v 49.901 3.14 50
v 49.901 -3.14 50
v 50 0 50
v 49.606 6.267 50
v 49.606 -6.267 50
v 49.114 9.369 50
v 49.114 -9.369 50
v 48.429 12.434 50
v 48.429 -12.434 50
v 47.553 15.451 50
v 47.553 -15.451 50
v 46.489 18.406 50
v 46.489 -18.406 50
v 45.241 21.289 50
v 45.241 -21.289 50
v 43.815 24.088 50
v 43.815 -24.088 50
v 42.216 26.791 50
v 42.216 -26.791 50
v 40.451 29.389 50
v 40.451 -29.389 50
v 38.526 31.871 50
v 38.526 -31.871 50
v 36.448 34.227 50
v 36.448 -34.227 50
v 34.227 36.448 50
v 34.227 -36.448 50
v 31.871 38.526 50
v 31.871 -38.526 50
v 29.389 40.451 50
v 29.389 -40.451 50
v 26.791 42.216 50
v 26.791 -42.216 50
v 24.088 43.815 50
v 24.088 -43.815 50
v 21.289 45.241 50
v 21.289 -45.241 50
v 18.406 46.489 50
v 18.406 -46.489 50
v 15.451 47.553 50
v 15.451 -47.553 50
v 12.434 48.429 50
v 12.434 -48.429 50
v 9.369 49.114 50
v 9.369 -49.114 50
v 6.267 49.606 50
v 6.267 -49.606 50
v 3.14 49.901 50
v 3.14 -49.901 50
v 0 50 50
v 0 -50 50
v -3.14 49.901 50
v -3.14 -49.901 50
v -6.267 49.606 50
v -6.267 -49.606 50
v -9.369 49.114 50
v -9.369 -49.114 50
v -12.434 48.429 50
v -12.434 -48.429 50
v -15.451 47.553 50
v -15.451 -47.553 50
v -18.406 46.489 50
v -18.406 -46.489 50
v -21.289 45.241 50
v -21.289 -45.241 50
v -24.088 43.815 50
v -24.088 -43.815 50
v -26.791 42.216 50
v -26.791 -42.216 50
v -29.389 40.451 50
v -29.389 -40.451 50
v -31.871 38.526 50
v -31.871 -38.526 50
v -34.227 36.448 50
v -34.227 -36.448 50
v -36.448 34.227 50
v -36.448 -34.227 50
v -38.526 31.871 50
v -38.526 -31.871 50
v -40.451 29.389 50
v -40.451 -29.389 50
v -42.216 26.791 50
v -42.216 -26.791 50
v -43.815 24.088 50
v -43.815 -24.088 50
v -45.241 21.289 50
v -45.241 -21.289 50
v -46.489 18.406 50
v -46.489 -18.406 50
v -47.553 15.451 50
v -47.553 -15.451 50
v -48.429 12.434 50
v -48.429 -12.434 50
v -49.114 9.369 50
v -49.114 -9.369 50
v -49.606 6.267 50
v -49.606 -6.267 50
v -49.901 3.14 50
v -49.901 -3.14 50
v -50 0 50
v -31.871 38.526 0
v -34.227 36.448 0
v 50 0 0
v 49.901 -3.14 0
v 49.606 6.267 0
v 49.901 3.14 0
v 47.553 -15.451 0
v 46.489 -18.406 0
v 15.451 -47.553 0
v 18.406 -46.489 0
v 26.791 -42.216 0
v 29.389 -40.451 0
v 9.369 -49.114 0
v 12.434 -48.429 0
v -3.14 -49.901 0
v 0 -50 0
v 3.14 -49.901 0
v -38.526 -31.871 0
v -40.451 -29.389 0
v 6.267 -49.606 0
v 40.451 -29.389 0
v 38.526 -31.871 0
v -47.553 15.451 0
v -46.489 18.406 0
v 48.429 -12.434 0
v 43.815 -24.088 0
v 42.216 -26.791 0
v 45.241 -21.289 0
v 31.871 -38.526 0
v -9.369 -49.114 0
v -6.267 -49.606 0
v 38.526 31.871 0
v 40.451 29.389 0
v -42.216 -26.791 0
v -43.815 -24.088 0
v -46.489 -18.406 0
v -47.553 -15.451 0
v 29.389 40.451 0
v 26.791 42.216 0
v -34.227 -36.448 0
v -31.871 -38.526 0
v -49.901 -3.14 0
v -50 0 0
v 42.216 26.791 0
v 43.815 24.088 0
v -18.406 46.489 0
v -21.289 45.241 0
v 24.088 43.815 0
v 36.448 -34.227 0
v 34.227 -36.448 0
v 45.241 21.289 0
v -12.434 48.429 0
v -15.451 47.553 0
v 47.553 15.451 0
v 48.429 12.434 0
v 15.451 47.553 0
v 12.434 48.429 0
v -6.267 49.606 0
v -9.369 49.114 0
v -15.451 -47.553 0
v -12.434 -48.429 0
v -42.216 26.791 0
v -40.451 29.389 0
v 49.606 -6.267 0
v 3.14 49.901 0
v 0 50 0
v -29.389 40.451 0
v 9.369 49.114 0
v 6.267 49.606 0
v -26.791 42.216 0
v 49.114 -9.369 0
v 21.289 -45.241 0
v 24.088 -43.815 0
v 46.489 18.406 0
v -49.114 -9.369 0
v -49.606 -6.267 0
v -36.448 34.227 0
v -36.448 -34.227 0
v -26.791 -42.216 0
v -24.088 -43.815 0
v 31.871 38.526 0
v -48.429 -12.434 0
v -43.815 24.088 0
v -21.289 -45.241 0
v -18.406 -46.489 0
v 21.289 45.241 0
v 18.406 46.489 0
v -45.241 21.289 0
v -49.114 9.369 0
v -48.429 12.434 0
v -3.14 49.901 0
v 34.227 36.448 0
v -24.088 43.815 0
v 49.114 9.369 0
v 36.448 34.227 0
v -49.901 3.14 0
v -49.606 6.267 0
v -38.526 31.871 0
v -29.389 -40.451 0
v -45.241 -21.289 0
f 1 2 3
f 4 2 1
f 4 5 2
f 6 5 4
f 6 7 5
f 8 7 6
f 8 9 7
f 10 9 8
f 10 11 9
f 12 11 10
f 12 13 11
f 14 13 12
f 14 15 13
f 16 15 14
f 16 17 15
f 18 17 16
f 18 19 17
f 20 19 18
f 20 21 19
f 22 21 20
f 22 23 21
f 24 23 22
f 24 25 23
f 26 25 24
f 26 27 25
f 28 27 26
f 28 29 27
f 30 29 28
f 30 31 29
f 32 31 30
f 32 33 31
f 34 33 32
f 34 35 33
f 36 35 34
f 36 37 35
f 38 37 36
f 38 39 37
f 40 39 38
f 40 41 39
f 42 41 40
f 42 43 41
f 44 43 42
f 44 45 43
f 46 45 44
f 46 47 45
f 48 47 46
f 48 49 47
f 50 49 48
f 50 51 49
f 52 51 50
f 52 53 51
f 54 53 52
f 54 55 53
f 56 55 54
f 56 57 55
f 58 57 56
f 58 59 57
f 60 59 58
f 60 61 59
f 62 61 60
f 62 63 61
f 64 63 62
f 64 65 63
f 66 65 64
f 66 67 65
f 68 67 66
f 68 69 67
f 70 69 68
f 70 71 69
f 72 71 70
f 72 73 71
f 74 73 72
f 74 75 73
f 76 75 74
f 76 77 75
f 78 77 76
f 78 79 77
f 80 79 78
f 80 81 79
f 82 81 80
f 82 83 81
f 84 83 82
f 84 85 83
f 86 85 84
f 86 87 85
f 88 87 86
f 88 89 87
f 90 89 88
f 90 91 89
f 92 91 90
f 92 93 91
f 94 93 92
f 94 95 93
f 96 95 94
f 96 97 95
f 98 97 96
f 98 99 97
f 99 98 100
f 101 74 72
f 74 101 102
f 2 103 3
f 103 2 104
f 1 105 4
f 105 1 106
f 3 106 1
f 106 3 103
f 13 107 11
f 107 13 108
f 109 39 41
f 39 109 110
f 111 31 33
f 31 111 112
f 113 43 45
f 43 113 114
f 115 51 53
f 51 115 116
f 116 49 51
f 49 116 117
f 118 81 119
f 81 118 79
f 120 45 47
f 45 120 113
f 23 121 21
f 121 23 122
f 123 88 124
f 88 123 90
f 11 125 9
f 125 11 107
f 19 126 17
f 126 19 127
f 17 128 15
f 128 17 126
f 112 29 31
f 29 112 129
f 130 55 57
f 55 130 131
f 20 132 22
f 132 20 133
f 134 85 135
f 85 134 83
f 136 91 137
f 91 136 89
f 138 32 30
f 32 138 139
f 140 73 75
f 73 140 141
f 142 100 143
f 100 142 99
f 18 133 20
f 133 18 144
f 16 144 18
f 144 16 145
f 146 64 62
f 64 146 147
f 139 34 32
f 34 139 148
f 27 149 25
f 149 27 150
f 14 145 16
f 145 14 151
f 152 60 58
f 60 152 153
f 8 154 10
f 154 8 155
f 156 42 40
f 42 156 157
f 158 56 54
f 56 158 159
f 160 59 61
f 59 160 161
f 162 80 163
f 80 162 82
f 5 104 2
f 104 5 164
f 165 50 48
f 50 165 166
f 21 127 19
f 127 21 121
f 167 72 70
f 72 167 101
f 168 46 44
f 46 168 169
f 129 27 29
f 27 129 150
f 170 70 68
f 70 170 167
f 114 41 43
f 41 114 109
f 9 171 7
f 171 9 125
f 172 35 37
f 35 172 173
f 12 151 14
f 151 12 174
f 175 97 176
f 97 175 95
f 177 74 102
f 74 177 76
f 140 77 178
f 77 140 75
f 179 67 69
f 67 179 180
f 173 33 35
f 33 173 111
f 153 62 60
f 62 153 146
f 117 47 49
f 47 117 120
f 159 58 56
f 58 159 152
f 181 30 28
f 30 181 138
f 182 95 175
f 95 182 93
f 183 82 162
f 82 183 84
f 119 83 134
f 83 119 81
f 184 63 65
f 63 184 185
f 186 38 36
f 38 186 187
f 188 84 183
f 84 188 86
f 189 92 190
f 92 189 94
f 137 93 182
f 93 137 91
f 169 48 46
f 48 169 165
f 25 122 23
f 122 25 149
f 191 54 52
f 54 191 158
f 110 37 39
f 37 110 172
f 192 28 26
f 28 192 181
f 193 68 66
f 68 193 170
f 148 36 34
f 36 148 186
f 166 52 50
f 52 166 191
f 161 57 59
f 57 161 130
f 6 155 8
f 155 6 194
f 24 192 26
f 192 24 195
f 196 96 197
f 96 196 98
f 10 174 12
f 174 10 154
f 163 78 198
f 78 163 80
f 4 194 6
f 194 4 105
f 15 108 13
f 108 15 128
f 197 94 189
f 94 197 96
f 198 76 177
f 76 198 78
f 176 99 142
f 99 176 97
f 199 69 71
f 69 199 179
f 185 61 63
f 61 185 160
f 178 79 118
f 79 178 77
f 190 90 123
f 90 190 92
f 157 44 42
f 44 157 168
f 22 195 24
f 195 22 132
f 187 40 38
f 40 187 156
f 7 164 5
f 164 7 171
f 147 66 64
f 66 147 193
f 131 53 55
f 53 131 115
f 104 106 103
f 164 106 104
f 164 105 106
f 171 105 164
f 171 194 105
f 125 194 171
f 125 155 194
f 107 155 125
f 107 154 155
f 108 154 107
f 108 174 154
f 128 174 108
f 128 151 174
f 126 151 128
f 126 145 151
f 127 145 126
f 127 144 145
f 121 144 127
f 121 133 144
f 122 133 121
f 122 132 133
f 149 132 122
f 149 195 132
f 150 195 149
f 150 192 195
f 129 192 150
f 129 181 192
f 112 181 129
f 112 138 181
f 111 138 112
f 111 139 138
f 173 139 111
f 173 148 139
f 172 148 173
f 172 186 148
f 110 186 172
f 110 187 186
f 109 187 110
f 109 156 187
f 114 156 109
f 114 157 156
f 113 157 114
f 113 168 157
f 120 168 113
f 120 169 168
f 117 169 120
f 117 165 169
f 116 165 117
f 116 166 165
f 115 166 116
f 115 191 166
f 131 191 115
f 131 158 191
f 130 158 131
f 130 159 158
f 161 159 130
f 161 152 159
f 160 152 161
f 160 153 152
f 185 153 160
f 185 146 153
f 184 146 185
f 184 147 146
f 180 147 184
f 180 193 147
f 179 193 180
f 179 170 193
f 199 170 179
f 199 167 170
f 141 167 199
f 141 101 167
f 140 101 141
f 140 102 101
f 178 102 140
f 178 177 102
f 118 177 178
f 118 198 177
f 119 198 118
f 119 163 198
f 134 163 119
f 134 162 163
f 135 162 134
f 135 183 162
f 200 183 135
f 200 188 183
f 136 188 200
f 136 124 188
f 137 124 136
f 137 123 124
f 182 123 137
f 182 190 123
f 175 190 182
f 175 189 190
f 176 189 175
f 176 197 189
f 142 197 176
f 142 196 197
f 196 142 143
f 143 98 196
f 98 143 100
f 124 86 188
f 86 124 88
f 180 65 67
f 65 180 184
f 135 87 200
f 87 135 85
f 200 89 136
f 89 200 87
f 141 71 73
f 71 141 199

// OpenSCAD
intersection(){cube(size=100.0000,center=true);cylinder(h=100.0000,d=100.0000,$fn=100);}
